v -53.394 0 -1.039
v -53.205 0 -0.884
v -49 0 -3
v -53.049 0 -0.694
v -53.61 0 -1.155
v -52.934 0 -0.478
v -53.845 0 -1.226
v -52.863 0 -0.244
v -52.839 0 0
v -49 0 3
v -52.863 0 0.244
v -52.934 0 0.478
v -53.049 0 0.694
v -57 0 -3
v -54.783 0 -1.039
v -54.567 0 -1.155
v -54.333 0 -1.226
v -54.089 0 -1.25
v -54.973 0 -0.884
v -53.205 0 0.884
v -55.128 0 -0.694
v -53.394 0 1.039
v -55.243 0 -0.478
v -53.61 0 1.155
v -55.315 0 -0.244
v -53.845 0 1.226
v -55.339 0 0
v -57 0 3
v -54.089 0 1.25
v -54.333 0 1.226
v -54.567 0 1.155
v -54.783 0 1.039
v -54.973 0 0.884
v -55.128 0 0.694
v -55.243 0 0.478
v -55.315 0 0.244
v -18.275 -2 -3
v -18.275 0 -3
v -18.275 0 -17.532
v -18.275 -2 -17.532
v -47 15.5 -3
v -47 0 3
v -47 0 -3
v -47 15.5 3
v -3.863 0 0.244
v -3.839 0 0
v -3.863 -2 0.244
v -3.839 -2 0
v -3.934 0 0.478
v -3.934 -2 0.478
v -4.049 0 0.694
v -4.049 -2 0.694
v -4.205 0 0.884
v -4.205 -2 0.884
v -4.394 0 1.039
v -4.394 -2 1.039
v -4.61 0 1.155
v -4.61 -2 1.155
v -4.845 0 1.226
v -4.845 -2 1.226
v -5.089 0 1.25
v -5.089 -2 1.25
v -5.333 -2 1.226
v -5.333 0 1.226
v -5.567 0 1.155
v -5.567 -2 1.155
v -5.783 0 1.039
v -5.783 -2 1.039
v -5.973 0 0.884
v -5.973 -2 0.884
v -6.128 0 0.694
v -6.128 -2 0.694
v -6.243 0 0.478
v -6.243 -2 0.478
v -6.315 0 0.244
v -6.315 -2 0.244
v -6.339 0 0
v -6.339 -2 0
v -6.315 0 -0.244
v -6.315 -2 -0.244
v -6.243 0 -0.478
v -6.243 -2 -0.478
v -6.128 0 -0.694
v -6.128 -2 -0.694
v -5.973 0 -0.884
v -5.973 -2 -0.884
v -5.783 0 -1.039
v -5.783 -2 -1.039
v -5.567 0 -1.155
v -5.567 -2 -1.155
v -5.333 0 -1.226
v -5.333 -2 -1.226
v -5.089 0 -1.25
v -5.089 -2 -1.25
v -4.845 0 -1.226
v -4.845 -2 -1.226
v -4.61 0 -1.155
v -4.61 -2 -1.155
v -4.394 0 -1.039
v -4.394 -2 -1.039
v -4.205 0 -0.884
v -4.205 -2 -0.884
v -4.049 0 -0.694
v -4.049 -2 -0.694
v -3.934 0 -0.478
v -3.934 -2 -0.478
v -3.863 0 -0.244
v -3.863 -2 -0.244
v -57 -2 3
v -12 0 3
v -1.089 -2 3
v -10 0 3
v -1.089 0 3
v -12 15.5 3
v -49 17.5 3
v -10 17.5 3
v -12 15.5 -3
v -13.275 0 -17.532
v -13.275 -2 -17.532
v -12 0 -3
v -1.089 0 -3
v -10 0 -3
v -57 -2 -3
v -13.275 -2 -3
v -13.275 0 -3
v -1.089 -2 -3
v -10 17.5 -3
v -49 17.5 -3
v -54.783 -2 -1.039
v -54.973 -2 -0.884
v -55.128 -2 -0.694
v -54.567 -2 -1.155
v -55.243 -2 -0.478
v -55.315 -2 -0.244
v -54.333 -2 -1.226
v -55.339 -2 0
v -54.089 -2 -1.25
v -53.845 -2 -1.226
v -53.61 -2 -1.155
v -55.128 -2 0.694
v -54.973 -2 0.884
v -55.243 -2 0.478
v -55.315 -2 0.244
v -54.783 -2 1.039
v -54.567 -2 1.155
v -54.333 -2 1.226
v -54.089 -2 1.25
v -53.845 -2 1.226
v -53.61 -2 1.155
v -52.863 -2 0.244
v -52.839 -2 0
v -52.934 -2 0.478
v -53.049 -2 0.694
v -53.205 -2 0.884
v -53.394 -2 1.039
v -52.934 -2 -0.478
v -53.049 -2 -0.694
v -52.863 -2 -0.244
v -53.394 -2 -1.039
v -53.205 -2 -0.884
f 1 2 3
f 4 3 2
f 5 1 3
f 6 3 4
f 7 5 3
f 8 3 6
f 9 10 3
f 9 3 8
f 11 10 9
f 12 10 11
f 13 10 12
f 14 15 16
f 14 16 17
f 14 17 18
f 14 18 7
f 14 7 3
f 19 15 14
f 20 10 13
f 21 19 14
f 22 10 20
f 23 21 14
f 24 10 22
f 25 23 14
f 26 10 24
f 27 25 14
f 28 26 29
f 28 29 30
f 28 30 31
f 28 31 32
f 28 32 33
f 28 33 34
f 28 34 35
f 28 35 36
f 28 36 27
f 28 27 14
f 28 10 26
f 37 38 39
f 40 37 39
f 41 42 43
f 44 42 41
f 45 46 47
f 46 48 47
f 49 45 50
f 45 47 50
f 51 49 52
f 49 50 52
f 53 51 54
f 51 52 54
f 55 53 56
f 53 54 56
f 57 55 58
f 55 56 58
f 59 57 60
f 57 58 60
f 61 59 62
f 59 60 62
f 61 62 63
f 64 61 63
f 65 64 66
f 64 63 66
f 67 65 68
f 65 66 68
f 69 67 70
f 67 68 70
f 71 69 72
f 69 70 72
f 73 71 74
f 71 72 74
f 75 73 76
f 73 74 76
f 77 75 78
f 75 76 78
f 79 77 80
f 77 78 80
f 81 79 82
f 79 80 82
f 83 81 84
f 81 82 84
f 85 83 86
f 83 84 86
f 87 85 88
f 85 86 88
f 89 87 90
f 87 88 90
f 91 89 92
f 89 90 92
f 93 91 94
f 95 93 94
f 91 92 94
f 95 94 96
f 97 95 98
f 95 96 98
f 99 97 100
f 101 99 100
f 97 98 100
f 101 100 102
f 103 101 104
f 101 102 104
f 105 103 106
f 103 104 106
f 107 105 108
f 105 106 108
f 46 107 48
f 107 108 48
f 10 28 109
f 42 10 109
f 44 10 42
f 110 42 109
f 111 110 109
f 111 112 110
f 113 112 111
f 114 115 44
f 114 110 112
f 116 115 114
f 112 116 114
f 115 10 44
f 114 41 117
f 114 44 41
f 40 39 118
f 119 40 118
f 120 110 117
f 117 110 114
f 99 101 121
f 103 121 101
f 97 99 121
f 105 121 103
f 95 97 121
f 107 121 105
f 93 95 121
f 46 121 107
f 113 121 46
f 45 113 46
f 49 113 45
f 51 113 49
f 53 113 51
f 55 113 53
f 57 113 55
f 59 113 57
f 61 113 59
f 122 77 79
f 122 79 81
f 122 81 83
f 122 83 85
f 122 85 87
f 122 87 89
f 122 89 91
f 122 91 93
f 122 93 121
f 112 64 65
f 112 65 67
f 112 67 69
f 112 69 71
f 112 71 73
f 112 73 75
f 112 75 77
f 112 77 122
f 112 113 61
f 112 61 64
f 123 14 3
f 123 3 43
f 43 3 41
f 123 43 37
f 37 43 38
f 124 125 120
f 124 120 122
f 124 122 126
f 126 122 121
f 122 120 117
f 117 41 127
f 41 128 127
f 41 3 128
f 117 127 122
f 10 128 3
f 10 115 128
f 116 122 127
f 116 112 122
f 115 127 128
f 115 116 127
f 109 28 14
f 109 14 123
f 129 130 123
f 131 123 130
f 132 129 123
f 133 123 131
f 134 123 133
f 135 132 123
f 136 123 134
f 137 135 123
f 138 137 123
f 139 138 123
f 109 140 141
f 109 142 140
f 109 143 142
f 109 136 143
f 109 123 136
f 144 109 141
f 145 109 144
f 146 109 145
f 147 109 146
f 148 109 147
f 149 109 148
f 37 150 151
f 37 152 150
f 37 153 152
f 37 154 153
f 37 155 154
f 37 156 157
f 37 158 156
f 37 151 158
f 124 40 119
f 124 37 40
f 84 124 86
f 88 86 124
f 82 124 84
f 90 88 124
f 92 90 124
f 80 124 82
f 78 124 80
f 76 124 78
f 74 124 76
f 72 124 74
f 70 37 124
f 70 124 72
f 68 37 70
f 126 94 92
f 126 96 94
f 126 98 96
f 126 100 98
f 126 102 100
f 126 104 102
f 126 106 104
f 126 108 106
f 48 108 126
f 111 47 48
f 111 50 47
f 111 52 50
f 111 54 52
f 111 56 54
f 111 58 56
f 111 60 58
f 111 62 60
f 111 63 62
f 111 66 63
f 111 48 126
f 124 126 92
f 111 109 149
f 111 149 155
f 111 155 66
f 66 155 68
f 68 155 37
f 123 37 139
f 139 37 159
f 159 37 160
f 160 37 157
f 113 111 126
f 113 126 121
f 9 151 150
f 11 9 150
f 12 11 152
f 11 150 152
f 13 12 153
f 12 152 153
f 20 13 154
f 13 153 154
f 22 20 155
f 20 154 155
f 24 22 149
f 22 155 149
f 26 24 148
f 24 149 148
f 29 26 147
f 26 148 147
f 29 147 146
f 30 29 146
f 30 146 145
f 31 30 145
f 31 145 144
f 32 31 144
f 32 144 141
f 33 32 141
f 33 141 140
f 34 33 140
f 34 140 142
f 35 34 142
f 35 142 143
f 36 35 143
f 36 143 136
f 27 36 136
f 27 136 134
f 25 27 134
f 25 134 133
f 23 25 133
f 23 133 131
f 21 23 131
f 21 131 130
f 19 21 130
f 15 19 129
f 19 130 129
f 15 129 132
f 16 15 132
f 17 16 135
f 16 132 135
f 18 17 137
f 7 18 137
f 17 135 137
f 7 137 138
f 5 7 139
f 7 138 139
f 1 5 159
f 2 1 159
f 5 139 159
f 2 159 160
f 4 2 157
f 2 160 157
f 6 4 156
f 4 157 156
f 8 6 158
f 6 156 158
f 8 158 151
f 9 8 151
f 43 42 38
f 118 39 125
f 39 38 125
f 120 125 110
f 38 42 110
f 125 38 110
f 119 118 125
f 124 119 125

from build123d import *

# Parameters (mm, degrees)
F0_W     = 35
F0_H     = 15.5
F1_DEPTH = 3
F2_R     = 1.25
F3_DEPTH = 12.5
F5_DEPTH = 2


# Not quite as in the source:
# - a feature names something its author has since deleted; it is built from what else it names


with BuildPart() as f1:
    # F0 (on Top) → F1 (new body, symmetric)
    with BuildSketch(Plane.XY):
        Polygon((-49, 0), (-57, 0), (-57, -2), (-1.0886418074, -2), (-1.0886418074, 0), (-10, 0), (-10, 17.5), (-49, 17.5), align=None)
        with Locations((-29.5, 7.75)):
            Rectangle(F0_W, F0_H, mode=Mode.SUBTRACT)
    extrude(amount=F1_DEPTH, both=True)

    # F2 (on face) → F3 (cut, symmetric)
    with BuildSketch(Plane.XZ.offset(2)):
        with Locations((-54.0886418074, 0)):
            Circle(F2_R)
        with Locations((-5.0886418074, 0)):
            Circle(F2_R)
    extrude(amount=F3_DEPTH, both=True, mode=Mode.SUBTRACT)

    # F4 (on Front) → F5 (join)
    with BuildSketch(Plane.XZ):
        Polygon((-13.2752051018, -17.5318677962), (-13.2752051018, -2.6883990917), (-18.2752051018, -2.6883990917), (-18.2752051018, -3.858309805), (-18.2752051018, -17.5318677962), align=None)
    extrude(amount=F5_DEPTH)


solid = f1.part
